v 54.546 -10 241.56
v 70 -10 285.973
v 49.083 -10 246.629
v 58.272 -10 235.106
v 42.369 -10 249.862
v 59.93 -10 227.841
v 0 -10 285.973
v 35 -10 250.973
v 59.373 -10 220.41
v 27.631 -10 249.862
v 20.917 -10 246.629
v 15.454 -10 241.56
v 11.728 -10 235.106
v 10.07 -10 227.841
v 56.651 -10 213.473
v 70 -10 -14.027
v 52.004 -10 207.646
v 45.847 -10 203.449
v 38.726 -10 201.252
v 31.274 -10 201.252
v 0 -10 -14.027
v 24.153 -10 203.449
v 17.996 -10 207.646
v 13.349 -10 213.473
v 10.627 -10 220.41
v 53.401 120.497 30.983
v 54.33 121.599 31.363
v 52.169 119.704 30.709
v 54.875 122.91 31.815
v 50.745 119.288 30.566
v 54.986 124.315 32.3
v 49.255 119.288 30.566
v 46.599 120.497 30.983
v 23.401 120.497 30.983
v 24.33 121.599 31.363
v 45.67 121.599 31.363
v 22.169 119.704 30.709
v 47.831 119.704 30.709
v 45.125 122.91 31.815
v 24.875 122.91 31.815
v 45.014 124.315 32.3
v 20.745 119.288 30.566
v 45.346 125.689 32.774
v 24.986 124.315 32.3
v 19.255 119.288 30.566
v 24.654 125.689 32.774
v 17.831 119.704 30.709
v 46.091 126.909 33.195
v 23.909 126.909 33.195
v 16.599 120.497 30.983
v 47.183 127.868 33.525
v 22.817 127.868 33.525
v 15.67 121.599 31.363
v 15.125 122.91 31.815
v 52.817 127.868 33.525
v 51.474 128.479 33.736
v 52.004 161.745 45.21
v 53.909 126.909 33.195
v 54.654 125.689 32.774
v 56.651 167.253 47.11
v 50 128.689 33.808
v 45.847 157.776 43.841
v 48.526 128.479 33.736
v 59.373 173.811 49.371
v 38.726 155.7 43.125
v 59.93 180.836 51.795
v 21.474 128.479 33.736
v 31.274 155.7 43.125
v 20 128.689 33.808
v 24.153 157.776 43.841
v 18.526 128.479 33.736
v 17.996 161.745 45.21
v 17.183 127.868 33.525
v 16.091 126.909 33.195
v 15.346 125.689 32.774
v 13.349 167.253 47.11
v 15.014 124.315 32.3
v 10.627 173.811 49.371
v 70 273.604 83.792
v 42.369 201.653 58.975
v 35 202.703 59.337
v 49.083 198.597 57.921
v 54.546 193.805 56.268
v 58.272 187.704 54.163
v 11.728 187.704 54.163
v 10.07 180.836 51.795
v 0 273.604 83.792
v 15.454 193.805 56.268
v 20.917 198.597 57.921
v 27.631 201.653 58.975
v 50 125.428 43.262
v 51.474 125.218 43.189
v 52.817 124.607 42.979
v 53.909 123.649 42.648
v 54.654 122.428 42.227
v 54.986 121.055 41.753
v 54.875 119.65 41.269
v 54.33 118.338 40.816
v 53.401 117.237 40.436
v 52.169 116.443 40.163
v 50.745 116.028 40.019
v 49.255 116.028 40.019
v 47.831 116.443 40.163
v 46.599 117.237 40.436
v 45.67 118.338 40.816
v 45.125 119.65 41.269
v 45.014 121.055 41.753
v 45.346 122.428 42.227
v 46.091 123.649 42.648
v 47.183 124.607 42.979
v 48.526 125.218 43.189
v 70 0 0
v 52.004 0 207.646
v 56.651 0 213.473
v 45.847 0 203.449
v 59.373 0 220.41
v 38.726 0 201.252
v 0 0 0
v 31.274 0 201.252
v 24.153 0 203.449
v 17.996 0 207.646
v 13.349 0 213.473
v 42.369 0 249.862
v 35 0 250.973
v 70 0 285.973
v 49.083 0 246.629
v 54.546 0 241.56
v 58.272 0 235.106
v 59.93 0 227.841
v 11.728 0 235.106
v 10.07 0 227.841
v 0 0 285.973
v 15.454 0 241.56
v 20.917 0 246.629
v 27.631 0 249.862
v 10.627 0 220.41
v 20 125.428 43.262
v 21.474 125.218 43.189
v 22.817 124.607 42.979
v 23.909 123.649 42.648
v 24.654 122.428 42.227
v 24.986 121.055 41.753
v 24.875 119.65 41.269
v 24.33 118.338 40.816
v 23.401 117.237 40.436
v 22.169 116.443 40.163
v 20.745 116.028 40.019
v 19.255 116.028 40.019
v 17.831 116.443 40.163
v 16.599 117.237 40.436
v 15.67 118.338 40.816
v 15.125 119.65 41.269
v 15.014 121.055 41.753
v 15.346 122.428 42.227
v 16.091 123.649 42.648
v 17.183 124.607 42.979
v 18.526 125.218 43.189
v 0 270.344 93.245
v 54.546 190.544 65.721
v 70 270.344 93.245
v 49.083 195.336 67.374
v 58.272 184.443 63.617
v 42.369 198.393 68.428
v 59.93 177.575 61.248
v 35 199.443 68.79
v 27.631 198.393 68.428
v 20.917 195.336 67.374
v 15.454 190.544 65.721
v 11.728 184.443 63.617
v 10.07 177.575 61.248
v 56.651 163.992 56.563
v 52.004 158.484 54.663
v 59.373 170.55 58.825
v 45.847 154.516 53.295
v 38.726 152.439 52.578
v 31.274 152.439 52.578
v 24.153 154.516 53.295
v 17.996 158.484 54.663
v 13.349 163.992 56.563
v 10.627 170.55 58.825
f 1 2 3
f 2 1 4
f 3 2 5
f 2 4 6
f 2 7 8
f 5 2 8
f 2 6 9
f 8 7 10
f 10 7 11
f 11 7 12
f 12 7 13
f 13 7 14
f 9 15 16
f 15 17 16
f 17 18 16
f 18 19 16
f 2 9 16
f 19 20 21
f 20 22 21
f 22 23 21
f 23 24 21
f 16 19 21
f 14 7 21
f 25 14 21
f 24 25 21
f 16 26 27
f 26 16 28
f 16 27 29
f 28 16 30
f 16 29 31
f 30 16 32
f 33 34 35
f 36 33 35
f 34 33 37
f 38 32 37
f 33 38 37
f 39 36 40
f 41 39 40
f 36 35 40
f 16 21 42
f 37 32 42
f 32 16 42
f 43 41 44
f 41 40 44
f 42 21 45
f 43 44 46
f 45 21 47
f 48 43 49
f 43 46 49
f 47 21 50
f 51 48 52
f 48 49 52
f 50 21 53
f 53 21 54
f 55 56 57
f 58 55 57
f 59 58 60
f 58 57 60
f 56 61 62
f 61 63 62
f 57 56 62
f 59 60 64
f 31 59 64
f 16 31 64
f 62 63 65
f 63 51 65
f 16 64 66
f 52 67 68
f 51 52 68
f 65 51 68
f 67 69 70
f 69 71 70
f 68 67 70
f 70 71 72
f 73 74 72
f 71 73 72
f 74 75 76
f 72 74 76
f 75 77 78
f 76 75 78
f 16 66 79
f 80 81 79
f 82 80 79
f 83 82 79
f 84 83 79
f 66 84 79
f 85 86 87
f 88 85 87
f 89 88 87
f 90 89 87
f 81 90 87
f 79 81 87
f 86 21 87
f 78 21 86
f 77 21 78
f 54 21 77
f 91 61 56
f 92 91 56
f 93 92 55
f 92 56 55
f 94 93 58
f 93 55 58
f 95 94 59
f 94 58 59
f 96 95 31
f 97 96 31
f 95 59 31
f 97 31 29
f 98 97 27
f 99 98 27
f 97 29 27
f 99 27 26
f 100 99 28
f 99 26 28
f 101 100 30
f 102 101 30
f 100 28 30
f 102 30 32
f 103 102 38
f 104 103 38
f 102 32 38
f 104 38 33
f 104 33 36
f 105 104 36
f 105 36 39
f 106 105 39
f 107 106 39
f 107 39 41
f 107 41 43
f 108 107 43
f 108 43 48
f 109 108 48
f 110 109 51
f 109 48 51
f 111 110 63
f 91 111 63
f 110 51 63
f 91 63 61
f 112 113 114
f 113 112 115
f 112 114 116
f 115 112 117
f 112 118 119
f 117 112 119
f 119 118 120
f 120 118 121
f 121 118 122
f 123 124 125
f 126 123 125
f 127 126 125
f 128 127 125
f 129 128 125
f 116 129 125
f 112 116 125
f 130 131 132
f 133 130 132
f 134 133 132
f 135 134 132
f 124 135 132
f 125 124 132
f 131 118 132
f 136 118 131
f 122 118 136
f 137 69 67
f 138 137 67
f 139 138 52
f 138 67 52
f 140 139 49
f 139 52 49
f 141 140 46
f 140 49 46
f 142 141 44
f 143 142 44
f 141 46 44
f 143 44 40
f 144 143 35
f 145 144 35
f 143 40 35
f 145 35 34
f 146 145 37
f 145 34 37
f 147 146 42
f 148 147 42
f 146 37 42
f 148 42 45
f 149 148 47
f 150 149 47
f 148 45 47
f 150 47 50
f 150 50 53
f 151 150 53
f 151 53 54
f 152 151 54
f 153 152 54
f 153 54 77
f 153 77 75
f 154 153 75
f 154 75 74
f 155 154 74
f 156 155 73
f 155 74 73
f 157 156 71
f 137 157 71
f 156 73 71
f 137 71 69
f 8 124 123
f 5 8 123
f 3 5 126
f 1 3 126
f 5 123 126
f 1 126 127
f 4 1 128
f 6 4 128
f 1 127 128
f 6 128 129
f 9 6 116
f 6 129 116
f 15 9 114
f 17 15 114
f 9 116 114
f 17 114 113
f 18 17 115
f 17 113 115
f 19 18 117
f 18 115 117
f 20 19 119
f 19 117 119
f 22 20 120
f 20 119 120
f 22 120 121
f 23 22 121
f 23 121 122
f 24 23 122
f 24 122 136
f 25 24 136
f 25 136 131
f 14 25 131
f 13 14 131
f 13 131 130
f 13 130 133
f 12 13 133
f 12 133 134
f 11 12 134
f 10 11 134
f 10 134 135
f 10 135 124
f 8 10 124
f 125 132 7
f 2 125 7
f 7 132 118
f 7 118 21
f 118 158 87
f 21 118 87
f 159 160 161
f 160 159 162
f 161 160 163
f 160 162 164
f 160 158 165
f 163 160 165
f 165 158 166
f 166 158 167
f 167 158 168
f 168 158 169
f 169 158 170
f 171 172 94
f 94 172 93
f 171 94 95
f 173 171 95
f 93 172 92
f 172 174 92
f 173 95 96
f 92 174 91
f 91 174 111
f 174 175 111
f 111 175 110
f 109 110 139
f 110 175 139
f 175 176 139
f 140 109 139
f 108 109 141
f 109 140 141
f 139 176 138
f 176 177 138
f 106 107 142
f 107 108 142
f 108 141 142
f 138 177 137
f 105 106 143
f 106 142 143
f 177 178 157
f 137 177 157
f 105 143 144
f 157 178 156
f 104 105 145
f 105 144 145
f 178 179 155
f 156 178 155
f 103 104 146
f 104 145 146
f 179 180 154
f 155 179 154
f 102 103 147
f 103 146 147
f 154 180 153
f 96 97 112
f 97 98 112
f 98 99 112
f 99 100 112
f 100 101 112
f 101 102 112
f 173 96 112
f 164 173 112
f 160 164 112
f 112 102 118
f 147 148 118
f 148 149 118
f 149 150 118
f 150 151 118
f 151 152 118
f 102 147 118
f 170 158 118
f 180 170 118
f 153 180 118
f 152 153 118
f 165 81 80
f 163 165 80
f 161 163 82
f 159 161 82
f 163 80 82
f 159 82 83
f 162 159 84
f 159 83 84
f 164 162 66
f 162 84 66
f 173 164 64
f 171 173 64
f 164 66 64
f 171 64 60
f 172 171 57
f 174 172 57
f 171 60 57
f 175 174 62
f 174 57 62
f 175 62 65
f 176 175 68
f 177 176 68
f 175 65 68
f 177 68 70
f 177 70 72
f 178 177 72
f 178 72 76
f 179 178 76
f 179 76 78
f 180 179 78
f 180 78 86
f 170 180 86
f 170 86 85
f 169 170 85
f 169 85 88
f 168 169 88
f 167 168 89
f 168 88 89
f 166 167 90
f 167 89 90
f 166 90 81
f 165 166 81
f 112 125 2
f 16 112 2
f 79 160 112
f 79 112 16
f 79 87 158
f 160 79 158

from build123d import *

# Parameters (mm, degrees)
BOSS_EXTRUDE1_DEPTH = 70
SKETCH2_R           = 25
CUT_EXTRUDE1_DEPTH  = 10
SKETCH5_R           = 25
CUT_EXTRUDE3_DEPTH  = 300
SKETCH6_R           = 5
CUT_EXTRUDE5_DEPTH  = 10


with BuildPart() as part:
    # Sketch1 → Boss-Extrude1 (new body)
    with BuildSketch(Plane(origin=(0, 0, 0), x_dir=(0, 0, -1), z_dir=(1, 0, 0))):
        Polygon((-93.245185093, 270.343761851), (0, 0), (-285.972750651, 0), (-285.972750651, -10), (14.027249349, -10), (-83.791705303, 273.604393673), align=None)
    extrude(amount=BOSS_EXTRUDE1_DEPTH)

    # Sketch2 → Cut-Extrude1 (cut)
    with BuildSketch(Plane(origin=(0, 3.260631822, -9.453479789), x_dir=(1, 0, 0), z_dir=(0, 0.3260631821748509, -0.945347978910417))):
        with Locations(Location((35, -185.972750651, 0), (0, 0, 270))):
            Circle(SKETCH2_R)
    extrude(amount=-CUT_EXTRUDE1_DEPTH, mode=Mode.SUBTRACT)

    # Sketch5 → Cut-Extrude3 (cut)
    with BuildSketch(Plane(origin=(0, 0, 0), x_dir=(1, 0, 0), z_dir=(0, 1, 0))):
        with Locations(Location((35, -225.972750651, 0), (0, 0, 270))):
            Circle(SKETCH5_R)
    extrude(amount=-CUT_EXTRUDE3_DEPTH, mode=Mode.SUBTRACT)

    # Sketch6 → Cut-Extrude5 (cut)
    with BuildSketch(Plane(origin=(0, 3.260631822, -9.453479789), x_dir=(1, 0, 0), z_dir=(0, 0.326063182174851, -0.945347978910417))):
        with Locations((50, -197.679491924)):
            Circle(SKETCH6_R)
        with Locations((20, -197.679491924)):
            Circle(SKETCH6_R)
        with Locations(Location((20, -127.679491924, 0), (0, 0, 270))):
            Circle(SKETCH6_R)
        with Locations(Location((50, -127.679491924, 0), (0, 0, 270))):
            Circle(SKETCH6_R)
    extrude(amount=-CUT_EXTRUDE5_DEPTH, mode=Mode.SUBTRACT)


solid = part.part
